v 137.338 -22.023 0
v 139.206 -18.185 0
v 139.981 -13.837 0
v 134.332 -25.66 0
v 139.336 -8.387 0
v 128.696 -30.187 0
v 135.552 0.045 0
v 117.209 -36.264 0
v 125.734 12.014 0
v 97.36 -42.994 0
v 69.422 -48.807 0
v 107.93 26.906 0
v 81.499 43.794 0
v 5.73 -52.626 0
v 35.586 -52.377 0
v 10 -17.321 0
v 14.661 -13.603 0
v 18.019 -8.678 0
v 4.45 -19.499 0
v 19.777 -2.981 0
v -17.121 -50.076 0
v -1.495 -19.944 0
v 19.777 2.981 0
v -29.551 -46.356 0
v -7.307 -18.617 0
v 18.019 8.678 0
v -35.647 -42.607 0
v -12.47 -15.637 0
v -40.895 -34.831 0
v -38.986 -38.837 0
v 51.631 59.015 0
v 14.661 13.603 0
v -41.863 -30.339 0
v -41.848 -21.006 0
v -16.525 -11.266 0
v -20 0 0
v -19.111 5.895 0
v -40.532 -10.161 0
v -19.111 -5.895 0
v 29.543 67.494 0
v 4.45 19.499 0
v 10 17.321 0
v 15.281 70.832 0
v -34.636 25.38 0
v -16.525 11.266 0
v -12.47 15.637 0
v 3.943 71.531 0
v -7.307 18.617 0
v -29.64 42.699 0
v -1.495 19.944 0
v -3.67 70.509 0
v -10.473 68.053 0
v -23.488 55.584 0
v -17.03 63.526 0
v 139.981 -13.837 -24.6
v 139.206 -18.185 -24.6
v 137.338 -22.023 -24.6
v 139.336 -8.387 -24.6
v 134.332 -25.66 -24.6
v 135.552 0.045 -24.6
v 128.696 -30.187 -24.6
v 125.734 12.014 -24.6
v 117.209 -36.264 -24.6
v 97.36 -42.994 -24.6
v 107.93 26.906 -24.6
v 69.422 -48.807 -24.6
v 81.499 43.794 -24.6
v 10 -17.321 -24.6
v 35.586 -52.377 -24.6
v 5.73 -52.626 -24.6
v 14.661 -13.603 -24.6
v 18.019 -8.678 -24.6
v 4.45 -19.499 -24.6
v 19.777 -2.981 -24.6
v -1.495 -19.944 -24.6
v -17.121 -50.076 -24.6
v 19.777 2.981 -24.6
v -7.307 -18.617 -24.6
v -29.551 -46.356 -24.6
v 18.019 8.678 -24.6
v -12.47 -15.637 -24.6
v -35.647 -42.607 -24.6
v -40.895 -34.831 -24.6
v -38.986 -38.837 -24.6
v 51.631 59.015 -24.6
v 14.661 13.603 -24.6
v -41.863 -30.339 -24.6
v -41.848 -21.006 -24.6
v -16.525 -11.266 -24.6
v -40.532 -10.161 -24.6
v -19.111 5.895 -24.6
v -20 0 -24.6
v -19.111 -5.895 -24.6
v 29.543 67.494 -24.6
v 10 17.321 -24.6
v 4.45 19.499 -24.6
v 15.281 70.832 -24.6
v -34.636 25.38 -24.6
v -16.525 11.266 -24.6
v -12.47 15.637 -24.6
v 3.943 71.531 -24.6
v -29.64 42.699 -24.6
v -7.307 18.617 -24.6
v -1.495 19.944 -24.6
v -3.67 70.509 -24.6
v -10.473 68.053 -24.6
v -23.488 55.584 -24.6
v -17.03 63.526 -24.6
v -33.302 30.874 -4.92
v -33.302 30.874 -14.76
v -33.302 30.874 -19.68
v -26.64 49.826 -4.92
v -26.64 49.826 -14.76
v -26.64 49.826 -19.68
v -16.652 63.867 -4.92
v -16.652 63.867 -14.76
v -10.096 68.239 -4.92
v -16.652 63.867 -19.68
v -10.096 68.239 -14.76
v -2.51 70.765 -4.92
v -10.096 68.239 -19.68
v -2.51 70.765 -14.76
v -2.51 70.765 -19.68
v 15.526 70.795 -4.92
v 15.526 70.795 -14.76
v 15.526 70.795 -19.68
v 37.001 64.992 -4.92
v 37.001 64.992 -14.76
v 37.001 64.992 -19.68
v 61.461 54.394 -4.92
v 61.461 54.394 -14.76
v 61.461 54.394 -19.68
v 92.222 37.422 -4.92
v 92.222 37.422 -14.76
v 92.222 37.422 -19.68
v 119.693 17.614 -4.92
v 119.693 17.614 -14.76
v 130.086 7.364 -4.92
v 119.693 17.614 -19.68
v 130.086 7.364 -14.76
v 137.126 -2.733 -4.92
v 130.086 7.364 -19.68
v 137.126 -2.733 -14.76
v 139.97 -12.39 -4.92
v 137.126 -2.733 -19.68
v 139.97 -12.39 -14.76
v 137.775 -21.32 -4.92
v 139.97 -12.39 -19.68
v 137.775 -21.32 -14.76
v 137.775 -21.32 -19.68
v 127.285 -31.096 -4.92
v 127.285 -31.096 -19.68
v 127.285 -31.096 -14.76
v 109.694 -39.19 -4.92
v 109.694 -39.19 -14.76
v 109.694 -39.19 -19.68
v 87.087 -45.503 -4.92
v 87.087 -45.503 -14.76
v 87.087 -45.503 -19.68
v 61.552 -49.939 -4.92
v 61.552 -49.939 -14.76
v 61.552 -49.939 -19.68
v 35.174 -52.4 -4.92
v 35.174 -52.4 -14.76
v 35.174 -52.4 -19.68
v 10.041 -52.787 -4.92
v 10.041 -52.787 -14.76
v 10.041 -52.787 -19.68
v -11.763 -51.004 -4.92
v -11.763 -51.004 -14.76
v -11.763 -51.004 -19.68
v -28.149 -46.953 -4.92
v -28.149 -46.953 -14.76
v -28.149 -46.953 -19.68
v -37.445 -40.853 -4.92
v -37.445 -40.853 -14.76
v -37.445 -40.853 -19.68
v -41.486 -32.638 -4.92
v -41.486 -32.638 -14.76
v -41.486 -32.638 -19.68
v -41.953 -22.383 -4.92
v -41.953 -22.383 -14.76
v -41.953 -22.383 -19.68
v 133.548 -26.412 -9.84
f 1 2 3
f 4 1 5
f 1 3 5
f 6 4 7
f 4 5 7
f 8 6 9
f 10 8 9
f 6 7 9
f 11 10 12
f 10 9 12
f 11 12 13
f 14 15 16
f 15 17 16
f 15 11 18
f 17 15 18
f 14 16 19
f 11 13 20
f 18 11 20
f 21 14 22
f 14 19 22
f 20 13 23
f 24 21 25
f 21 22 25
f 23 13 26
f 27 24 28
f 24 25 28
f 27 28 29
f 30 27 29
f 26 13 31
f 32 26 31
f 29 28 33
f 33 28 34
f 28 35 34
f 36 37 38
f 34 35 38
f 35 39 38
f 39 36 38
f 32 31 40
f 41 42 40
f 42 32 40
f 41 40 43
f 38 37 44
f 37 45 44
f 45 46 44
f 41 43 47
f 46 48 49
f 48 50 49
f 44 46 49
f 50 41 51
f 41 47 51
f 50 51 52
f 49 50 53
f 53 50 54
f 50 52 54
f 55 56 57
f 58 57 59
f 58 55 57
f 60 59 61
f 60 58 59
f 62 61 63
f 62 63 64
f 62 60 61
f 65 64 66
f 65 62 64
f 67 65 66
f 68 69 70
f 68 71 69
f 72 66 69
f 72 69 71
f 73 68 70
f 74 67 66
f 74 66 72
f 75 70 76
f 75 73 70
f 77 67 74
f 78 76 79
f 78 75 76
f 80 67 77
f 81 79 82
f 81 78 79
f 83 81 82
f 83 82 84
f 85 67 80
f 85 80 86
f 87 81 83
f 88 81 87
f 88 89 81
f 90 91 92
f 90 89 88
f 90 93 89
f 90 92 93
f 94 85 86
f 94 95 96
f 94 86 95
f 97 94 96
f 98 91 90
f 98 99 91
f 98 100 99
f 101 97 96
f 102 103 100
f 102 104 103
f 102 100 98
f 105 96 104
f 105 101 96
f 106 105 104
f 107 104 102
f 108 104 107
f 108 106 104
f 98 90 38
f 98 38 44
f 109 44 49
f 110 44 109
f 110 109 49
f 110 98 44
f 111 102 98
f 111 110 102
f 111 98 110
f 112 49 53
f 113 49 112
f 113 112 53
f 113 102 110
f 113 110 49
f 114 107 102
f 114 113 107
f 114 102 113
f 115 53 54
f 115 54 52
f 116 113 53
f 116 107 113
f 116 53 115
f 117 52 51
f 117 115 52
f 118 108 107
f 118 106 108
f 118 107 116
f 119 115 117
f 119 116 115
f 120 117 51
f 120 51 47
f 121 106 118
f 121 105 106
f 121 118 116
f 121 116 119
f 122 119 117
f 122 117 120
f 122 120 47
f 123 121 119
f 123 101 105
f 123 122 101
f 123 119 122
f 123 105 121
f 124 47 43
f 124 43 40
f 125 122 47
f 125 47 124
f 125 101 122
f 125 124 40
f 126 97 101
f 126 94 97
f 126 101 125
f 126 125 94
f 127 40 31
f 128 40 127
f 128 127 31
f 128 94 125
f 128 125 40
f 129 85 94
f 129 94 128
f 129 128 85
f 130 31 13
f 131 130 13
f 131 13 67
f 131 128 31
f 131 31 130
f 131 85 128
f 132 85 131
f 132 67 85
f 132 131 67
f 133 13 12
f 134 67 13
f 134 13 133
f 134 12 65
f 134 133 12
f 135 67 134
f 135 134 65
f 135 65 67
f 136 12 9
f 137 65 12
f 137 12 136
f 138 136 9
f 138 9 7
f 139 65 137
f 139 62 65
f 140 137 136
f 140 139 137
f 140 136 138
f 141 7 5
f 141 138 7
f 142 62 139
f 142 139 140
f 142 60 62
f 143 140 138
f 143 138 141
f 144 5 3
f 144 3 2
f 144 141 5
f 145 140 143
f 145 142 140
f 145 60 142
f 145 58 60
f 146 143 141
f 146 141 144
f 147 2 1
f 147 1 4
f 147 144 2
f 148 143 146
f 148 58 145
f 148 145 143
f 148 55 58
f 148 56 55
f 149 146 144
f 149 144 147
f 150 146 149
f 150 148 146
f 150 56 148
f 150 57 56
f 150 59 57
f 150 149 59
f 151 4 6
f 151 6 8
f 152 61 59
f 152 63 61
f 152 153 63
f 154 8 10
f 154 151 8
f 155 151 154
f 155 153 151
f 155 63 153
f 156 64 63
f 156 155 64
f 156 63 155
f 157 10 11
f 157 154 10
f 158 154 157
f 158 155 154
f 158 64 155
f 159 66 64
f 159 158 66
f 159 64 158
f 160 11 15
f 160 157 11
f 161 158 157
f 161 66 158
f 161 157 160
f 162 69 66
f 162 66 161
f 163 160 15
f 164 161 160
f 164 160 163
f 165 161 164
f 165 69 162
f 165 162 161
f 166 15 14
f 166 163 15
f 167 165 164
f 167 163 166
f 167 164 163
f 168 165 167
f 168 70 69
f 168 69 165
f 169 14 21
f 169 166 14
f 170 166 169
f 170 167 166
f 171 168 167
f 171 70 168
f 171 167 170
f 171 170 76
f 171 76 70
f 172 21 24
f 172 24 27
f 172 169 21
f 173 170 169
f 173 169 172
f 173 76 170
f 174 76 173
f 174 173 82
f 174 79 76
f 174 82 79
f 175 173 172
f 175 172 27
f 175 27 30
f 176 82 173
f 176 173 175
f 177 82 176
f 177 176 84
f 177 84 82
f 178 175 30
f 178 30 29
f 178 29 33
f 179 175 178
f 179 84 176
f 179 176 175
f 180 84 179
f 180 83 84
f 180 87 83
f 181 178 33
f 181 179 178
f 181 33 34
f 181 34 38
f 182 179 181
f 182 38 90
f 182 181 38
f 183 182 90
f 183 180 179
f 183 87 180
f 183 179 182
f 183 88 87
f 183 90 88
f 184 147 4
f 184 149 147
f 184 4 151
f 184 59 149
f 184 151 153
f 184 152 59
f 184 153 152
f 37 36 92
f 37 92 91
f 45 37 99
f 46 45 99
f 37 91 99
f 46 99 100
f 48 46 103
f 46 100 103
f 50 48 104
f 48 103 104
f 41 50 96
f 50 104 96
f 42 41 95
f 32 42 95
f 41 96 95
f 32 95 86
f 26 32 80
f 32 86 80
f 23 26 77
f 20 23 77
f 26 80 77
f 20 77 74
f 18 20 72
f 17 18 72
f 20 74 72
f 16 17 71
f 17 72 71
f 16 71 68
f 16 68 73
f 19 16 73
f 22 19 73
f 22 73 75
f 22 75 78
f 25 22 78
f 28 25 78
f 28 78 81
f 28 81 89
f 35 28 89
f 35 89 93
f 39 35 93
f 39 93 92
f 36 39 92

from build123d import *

# Parameters (mm, degrees)
F1_DEPTH = 24.6
F3_D     = 40


with BuildPart() as f1:
    # F0 (on Top) → F1 (new body)
    with BuildSketch(Plane.XY):
        with BuildLine():
            add(Edge.make_bspline(
                [(-90.7017812133, -44.2164130509), (-87.2951766536, -19.3386212515), (-78.2572317706, 50.8527069634), (9.212308129, 29.2079941802), (162.6994054713, -74.5426669959), (-98.8301450795, -100.3665161081), (-93.1083617996, -61.7912180293), (-90.7017812133, -44.2164130509)],
                knots=[0, 0, 0, 0, 0.186672163, 0.3744223937, 0.5938744415, 0.8681262837, 1, 1, 1, 1], degree=3))
        make_face()
    extrude(amount=F1_DEPTH)

    # F3 (through all)
    with Locations(Plane.XY.offset(24.6)):
        with Locations((-50.1700006425, -34.0551808476)):
            Hole(F3_D / 2)


with BuildPart() as f1_1:
    # F4: moved
    add(f1.part.moved(Location((50.1700006425, 34.0551808476, -24.6))))


solid = f1_1.part
